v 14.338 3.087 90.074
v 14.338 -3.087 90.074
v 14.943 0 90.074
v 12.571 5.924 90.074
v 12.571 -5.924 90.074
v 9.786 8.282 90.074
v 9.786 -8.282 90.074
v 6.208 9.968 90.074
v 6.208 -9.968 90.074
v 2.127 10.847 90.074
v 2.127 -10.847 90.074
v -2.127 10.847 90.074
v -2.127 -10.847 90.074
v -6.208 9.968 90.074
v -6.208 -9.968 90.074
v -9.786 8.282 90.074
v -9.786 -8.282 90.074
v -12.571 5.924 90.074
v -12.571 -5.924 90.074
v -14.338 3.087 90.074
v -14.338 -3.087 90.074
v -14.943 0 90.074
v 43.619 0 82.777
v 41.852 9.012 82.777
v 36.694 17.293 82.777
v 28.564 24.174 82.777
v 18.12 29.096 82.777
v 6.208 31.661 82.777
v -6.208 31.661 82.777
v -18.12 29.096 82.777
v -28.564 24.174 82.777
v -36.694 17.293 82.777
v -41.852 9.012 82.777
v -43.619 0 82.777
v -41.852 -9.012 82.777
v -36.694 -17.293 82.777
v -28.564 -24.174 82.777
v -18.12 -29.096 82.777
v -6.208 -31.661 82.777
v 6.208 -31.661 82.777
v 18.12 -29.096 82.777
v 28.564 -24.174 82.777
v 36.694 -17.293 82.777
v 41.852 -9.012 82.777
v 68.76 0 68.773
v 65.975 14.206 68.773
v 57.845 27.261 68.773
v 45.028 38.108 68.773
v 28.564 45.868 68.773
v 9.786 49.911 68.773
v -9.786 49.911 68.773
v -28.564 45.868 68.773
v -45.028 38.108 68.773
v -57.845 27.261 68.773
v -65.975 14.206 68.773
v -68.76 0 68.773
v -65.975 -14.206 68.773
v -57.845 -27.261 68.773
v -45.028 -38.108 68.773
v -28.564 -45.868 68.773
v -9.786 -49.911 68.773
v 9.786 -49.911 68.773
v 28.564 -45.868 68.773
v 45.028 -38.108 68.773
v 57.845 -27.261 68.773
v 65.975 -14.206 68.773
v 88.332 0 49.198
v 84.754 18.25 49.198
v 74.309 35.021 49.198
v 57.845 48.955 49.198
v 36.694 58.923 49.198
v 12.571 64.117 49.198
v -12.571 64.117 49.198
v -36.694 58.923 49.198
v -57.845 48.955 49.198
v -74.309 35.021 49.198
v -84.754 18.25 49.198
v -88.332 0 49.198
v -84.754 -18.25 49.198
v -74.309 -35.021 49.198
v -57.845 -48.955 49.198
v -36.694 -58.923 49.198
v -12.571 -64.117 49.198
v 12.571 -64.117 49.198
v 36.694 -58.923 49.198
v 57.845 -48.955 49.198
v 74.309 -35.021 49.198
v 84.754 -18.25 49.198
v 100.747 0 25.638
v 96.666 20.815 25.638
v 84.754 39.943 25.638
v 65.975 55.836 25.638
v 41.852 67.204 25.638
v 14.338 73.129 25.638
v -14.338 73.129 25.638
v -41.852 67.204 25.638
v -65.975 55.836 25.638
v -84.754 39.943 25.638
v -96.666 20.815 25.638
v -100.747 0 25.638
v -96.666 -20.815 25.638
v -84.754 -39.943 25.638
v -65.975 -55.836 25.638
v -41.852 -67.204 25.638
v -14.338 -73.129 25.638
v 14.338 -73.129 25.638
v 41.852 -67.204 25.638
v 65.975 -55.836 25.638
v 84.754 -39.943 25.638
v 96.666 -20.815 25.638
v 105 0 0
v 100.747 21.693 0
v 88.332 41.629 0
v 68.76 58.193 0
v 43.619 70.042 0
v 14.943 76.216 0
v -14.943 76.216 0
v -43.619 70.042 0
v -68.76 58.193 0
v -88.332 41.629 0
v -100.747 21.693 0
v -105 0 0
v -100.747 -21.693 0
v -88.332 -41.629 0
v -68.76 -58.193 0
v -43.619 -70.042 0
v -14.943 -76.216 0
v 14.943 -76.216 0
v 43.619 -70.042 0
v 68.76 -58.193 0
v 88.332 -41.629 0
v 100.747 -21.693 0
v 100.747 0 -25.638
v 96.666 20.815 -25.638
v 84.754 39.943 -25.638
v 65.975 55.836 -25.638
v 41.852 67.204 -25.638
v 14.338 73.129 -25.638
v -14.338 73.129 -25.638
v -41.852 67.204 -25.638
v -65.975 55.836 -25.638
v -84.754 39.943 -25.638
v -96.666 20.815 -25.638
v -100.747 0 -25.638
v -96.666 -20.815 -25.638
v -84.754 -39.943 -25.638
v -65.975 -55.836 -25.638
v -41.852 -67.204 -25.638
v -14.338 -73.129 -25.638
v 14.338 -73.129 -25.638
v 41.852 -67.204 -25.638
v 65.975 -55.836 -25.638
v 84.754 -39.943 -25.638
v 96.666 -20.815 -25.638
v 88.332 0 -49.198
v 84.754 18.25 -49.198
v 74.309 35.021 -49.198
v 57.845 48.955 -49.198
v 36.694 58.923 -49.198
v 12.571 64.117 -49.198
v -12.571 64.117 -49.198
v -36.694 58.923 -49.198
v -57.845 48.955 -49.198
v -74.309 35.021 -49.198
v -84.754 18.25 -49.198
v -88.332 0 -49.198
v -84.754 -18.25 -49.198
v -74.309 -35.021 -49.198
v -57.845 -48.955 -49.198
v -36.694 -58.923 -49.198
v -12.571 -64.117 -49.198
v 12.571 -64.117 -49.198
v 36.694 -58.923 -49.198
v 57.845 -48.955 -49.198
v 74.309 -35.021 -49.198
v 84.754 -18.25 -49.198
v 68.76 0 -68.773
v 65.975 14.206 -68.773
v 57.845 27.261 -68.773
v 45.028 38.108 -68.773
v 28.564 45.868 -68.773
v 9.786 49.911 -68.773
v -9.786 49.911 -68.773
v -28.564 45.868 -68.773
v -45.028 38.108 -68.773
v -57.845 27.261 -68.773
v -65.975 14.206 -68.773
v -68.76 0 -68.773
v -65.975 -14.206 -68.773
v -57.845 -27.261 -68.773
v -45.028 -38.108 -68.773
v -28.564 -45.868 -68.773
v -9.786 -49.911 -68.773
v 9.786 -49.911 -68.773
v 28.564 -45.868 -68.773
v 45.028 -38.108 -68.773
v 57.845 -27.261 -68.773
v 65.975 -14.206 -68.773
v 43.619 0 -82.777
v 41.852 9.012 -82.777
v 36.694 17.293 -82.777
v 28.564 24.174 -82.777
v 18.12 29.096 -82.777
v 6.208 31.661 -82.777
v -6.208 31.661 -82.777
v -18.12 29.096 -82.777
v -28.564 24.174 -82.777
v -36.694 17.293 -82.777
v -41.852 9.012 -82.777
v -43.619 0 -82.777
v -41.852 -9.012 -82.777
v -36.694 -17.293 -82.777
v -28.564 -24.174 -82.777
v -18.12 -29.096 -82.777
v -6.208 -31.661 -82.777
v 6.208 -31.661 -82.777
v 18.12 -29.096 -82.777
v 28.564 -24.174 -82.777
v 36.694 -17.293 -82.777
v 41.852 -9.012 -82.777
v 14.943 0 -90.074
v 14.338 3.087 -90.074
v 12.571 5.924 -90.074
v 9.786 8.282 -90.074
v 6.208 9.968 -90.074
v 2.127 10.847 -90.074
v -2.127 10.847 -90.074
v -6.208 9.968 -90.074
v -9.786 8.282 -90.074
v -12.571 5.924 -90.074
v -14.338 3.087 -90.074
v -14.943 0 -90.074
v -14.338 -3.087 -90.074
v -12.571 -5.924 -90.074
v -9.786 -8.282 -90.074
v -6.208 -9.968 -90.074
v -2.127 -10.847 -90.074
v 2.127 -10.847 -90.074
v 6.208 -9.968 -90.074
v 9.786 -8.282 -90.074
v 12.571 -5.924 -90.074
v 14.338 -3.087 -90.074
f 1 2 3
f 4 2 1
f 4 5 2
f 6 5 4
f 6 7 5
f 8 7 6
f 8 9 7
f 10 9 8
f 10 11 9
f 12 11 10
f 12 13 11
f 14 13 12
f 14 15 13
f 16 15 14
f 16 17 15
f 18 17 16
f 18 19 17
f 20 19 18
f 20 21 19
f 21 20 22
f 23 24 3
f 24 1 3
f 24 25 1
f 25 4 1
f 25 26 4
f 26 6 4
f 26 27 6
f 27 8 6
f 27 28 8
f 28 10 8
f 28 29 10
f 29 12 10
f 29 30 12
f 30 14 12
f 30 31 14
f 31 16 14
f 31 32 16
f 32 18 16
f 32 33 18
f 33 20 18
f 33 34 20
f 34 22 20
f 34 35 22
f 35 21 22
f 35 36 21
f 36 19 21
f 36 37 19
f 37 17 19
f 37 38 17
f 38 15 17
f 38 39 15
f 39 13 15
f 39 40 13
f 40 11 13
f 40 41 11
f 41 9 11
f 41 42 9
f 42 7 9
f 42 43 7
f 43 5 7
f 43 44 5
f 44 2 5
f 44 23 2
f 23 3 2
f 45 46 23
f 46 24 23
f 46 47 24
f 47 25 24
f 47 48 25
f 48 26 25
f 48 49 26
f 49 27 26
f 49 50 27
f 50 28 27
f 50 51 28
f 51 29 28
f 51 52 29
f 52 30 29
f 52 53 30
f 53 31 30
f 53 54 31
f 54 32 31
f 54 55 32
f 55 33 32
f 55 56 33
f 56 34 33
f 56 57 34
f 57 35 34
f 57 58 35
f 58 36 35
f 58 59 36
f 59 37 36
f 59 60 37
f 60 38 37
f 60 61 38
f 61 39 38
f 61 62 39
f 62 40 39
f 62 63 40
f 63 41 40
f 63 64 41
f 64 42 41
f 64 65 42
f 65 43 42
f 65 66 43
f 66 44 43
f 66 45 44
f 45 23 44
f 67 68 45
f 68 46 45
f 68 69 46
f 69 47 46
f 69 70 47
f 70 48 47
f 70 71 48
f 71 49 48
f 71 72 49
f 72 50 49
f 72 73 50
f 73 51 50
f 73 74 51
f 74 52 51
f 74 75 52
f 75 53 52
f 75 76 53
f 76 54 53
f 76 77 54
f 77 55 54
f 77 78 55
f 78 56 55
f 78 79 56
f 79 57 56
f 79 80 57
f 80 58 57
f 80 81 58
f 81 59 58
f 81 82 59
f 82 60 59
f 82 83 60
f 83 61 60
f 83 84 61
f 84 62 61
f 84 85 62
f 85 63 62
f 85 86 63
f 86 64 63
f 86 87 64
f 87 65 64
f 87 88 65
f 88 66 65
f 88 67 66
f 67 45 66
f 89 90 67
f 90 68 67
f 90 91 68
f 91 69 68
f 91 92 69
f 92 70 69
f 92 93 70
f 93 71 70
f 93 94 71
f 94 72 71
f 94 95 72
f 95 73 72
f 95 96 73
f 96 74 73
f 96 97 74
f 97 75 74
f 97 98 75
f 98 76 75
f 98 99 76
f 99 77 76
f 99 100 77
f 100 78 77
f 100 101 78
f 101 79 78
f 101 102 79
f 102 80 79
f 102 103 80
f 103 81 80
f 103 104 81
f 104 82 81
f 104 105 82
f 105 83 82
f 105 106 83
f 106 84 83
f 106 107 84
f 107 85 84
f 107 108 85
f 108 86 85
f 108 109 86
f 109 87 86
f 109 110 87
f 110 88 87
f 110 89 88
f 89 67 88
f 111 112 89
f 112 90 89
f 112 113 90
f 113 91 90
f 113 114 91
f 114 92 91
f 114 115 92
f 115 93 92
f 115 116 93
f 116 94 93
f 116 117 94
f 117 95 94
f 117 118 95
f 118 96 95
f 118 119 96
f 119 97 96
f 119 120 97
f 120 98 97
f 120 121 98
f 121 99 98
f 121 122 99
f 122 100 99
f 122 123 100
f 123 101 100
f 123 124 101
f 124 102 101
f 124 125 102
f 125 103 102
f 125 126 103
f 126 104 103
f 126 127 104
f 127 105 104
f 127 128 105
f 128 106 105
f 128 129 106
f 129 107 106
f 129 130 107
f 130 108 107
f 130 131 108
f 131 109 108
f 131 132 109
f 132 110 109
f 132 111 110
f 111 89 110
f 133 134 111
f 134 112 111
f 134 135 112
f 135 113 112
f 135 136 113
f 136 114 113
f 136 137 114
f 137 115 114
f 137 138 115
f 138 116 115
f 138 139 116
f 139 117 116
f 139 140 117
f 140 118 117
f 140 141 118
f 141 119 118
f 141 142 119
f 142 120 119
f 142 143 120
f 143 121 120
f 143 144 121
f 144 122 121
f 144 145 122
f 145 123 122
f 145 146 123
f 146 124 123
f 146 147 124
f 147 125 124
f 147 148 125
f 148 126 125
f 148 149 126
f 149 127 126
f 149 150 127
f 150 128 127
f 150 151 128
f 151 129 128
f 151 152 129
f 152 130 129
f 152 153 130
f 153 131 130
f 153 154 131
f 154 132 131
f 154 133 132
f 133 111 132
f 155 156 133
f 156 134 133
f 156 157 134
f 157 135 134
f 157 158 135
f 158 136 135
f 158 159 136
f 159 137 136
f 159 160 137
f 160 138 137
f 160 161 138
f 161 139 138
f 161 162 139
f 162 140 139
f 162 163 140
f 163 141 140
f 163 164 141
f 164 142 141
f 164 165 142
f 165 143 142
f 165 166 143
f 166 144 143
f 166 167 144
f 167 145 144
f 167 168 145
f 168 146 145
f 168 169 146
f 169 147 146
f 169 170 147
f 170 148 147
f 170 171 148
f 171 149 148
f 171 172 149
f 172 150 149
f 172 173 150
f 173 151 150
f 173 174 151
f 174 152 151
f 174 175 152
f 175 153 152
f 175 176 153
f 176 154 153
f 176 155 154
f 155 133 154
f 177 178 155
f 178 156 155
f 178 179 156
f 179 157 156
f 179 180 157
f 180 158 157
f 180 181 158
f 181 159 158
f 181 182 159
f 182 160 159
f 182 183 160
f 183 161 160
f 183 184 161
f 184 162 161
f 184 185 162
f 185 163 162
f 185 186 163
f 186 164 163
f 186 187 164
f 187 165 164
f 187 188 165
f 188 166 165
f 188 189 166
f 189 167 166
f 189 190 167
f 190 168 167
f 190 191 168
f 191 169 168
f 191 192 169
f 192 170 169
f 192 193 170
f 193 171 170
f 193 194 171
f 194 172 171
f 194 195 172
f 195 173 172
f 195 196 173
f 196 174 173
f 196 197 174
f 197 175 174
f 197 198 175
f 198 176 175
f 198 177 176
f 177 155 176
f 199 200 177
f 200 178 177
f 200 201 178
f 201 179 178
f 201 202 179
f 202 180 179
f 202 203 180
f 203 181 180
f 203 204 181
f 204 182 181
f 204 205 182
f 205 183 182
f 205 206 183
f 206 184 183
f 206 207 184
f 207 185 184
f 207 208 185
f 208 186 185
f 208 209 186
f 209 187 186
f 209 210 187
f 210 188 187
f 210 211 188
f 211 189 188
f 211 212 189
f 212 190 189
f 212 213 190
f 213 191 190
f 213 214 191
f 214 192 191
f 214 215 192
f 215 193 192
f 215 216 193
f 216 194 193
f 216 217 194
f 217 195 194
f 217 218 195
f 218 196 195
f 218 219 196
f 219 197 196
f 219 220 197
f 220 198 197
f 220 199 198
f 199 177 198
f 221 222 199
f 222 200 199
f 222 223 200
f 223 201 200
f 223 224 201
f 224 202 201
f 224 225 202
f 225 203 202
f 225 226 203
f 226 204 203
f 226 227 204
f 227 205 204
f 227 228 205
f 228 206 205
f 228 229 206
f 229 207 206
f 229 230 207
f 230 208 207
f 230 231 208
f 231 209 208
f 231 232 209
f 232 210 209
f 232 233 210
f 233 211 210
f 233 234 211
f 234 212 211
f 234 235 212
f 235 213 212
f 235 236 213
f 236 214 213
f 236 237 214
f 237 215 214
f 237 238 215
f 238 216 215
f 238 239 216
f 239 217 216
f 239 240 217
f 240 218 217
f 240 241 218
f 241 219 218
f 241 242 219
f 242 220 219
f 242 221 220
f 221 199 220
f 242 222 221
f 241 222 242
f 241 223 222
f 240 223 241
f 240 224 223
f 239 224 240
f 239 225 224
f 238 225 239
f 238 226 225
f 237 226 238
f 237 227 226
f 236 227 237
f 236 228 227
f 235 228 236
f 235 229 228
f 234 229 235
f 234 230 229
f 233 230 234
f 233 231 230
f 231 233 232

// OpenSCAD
// Generated by SolidPython 1.0.1 on 2020-07-29 00:46:52


scale(v = [15, 11, 13]) {
	sphere(r = 7);
}
/***********************************************
*********      SolidPython code:      **********
************************************************
 
# import packages: SolidPython
from solid import *
from solid.utils import *
from itertools import chain, combinations, permutations


class Resize:

    def __init__(self, scad_file):
        self.scad_file = scad_file
        #self.scad_file = import_scad(scad_file)
        # cone/cylinder param:
        self.r1 = 0
        self.r2 = 0
        self.h = 0
        # rectangular prism param:
        self.w = 0
        self.l = 0
        # ellipse param:
        self.r = 0

    # import OpenScad code (file name corresponds to shape)


    # classify shape + parameters
    def assign(self, param1, param2, param3):
        if self.scad_file == 'cone.scad':
            self.r1 = param1
            self.r2 = param2
            self.h = param3
        elif self.scad_file == 'cylinder.scad':
            self.r1 = param1
            self.r2 = param2
            self.h = param3
        elif self.scad_file == 'rectangularPrism.scad':
            self.h = param1
            self.l = param2
            self.w = param3
        else:
            self.r = param1
            self.h = param2

    # resize parameters
    def iterate(self):
        x = range(3, 20, 2)
        i = 1
        if self.scad_file == 'cone.scad':
            tempList = list(permutations(x, 2))
            for temp in tempList:
                param1 = temp[0]
                param2 = temp[1]
                filepath = 'produced_scad_files/' + 'cone' + str(param1) + '_' + str(param2) + '_' + '.scad'
                scad_render_to_file(cylinder(h=param1, r1=param2, r2=0), filepath)

        elif self.scad_file == 'cylinder.scad':
            tempList = list(permutations(x, 3))
            for temp in tempList:
                param1 = temp[0]
                param2 = temp[1]
                filepath = 'produced_scad_files/' + 'cylinder' + str(param1) + '_' + str(param2) + '_' + '.scad'
                scad_render_to_file(cylinder(h=param1, r1=param2, r2=param2), filepath)

        elif self.scad_file == 'rectangularPrism.scad':
            tempList = list(permutations(x, 3))
            for temp in tempList:
                param1 = temp[0]
                param2 = temp[1]
                param3 = temp[2]
                filepath = 'produced_scad_files/' + 'rectangularPrism' + str(param1) + '_' + str(param2) + '_' + str(
                    param3) + '.scad'
                scad_render_to_file(cube(size=(param1, param2, param3)), filepath)

        elif self.scad_file == 'ellipse.scad':
            tempList = list(permutations(x, 4))
            for temp in tempList:
                param1 = temp[0]
                param2 = temp[1]
                param3 = temp[2]
                param4 = temp[3]
                filepath = 'produced_scad_files/' + 'ellipse' + str(param1) + '_' + str(param2) + '_' + str(param3) + '_' + str(param4) + '.scad'
                scad_render_to_file(scale([param1, param2, param3])(sphere(r=param4)), filepath)

    def render_to_scadfile(self):
        scad_render_to_file(scad, 'example.scad') 
 
************************************************/
